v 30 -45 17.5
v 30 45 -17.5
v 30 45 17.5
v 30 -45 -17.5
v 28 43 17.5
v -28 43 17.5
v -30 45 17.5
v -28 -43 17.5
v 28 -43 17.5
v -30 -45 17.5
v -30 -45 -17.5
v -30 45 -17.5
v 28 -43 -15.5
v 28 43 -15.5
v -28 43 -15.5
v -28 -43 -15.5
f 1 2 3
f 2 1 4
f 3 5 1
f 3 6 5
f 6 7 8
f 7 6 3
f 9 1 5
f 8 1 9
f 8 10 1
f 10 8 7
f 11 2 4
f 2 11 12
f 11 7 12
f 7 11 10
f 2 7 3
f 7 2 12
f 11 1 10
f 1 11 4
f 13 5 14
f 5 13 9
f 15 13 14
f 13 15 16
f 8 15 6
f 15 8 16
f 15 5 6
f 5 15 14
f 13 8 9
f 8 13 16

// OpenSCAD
// Template Base Paramétrico - OpenSCAD
$fn = 60;

// --- Parâmetros ---
largura = 60.0;
comprimento = 90.0;
altura = 35.0;
espessura_parede = 2.0;
tolerancia_encaixe = 0.25;

// --- Módulos ---
module caixa_base() {
    difference() {
        cube([largura, comprimento, altura], center = true);
        translate([0, 0, espessura_parede])
            cube([largura - (espessura_parede * 2), comprimento - (espessura_parede * 2), altura], center = true);
    }
}

caixa_base();
